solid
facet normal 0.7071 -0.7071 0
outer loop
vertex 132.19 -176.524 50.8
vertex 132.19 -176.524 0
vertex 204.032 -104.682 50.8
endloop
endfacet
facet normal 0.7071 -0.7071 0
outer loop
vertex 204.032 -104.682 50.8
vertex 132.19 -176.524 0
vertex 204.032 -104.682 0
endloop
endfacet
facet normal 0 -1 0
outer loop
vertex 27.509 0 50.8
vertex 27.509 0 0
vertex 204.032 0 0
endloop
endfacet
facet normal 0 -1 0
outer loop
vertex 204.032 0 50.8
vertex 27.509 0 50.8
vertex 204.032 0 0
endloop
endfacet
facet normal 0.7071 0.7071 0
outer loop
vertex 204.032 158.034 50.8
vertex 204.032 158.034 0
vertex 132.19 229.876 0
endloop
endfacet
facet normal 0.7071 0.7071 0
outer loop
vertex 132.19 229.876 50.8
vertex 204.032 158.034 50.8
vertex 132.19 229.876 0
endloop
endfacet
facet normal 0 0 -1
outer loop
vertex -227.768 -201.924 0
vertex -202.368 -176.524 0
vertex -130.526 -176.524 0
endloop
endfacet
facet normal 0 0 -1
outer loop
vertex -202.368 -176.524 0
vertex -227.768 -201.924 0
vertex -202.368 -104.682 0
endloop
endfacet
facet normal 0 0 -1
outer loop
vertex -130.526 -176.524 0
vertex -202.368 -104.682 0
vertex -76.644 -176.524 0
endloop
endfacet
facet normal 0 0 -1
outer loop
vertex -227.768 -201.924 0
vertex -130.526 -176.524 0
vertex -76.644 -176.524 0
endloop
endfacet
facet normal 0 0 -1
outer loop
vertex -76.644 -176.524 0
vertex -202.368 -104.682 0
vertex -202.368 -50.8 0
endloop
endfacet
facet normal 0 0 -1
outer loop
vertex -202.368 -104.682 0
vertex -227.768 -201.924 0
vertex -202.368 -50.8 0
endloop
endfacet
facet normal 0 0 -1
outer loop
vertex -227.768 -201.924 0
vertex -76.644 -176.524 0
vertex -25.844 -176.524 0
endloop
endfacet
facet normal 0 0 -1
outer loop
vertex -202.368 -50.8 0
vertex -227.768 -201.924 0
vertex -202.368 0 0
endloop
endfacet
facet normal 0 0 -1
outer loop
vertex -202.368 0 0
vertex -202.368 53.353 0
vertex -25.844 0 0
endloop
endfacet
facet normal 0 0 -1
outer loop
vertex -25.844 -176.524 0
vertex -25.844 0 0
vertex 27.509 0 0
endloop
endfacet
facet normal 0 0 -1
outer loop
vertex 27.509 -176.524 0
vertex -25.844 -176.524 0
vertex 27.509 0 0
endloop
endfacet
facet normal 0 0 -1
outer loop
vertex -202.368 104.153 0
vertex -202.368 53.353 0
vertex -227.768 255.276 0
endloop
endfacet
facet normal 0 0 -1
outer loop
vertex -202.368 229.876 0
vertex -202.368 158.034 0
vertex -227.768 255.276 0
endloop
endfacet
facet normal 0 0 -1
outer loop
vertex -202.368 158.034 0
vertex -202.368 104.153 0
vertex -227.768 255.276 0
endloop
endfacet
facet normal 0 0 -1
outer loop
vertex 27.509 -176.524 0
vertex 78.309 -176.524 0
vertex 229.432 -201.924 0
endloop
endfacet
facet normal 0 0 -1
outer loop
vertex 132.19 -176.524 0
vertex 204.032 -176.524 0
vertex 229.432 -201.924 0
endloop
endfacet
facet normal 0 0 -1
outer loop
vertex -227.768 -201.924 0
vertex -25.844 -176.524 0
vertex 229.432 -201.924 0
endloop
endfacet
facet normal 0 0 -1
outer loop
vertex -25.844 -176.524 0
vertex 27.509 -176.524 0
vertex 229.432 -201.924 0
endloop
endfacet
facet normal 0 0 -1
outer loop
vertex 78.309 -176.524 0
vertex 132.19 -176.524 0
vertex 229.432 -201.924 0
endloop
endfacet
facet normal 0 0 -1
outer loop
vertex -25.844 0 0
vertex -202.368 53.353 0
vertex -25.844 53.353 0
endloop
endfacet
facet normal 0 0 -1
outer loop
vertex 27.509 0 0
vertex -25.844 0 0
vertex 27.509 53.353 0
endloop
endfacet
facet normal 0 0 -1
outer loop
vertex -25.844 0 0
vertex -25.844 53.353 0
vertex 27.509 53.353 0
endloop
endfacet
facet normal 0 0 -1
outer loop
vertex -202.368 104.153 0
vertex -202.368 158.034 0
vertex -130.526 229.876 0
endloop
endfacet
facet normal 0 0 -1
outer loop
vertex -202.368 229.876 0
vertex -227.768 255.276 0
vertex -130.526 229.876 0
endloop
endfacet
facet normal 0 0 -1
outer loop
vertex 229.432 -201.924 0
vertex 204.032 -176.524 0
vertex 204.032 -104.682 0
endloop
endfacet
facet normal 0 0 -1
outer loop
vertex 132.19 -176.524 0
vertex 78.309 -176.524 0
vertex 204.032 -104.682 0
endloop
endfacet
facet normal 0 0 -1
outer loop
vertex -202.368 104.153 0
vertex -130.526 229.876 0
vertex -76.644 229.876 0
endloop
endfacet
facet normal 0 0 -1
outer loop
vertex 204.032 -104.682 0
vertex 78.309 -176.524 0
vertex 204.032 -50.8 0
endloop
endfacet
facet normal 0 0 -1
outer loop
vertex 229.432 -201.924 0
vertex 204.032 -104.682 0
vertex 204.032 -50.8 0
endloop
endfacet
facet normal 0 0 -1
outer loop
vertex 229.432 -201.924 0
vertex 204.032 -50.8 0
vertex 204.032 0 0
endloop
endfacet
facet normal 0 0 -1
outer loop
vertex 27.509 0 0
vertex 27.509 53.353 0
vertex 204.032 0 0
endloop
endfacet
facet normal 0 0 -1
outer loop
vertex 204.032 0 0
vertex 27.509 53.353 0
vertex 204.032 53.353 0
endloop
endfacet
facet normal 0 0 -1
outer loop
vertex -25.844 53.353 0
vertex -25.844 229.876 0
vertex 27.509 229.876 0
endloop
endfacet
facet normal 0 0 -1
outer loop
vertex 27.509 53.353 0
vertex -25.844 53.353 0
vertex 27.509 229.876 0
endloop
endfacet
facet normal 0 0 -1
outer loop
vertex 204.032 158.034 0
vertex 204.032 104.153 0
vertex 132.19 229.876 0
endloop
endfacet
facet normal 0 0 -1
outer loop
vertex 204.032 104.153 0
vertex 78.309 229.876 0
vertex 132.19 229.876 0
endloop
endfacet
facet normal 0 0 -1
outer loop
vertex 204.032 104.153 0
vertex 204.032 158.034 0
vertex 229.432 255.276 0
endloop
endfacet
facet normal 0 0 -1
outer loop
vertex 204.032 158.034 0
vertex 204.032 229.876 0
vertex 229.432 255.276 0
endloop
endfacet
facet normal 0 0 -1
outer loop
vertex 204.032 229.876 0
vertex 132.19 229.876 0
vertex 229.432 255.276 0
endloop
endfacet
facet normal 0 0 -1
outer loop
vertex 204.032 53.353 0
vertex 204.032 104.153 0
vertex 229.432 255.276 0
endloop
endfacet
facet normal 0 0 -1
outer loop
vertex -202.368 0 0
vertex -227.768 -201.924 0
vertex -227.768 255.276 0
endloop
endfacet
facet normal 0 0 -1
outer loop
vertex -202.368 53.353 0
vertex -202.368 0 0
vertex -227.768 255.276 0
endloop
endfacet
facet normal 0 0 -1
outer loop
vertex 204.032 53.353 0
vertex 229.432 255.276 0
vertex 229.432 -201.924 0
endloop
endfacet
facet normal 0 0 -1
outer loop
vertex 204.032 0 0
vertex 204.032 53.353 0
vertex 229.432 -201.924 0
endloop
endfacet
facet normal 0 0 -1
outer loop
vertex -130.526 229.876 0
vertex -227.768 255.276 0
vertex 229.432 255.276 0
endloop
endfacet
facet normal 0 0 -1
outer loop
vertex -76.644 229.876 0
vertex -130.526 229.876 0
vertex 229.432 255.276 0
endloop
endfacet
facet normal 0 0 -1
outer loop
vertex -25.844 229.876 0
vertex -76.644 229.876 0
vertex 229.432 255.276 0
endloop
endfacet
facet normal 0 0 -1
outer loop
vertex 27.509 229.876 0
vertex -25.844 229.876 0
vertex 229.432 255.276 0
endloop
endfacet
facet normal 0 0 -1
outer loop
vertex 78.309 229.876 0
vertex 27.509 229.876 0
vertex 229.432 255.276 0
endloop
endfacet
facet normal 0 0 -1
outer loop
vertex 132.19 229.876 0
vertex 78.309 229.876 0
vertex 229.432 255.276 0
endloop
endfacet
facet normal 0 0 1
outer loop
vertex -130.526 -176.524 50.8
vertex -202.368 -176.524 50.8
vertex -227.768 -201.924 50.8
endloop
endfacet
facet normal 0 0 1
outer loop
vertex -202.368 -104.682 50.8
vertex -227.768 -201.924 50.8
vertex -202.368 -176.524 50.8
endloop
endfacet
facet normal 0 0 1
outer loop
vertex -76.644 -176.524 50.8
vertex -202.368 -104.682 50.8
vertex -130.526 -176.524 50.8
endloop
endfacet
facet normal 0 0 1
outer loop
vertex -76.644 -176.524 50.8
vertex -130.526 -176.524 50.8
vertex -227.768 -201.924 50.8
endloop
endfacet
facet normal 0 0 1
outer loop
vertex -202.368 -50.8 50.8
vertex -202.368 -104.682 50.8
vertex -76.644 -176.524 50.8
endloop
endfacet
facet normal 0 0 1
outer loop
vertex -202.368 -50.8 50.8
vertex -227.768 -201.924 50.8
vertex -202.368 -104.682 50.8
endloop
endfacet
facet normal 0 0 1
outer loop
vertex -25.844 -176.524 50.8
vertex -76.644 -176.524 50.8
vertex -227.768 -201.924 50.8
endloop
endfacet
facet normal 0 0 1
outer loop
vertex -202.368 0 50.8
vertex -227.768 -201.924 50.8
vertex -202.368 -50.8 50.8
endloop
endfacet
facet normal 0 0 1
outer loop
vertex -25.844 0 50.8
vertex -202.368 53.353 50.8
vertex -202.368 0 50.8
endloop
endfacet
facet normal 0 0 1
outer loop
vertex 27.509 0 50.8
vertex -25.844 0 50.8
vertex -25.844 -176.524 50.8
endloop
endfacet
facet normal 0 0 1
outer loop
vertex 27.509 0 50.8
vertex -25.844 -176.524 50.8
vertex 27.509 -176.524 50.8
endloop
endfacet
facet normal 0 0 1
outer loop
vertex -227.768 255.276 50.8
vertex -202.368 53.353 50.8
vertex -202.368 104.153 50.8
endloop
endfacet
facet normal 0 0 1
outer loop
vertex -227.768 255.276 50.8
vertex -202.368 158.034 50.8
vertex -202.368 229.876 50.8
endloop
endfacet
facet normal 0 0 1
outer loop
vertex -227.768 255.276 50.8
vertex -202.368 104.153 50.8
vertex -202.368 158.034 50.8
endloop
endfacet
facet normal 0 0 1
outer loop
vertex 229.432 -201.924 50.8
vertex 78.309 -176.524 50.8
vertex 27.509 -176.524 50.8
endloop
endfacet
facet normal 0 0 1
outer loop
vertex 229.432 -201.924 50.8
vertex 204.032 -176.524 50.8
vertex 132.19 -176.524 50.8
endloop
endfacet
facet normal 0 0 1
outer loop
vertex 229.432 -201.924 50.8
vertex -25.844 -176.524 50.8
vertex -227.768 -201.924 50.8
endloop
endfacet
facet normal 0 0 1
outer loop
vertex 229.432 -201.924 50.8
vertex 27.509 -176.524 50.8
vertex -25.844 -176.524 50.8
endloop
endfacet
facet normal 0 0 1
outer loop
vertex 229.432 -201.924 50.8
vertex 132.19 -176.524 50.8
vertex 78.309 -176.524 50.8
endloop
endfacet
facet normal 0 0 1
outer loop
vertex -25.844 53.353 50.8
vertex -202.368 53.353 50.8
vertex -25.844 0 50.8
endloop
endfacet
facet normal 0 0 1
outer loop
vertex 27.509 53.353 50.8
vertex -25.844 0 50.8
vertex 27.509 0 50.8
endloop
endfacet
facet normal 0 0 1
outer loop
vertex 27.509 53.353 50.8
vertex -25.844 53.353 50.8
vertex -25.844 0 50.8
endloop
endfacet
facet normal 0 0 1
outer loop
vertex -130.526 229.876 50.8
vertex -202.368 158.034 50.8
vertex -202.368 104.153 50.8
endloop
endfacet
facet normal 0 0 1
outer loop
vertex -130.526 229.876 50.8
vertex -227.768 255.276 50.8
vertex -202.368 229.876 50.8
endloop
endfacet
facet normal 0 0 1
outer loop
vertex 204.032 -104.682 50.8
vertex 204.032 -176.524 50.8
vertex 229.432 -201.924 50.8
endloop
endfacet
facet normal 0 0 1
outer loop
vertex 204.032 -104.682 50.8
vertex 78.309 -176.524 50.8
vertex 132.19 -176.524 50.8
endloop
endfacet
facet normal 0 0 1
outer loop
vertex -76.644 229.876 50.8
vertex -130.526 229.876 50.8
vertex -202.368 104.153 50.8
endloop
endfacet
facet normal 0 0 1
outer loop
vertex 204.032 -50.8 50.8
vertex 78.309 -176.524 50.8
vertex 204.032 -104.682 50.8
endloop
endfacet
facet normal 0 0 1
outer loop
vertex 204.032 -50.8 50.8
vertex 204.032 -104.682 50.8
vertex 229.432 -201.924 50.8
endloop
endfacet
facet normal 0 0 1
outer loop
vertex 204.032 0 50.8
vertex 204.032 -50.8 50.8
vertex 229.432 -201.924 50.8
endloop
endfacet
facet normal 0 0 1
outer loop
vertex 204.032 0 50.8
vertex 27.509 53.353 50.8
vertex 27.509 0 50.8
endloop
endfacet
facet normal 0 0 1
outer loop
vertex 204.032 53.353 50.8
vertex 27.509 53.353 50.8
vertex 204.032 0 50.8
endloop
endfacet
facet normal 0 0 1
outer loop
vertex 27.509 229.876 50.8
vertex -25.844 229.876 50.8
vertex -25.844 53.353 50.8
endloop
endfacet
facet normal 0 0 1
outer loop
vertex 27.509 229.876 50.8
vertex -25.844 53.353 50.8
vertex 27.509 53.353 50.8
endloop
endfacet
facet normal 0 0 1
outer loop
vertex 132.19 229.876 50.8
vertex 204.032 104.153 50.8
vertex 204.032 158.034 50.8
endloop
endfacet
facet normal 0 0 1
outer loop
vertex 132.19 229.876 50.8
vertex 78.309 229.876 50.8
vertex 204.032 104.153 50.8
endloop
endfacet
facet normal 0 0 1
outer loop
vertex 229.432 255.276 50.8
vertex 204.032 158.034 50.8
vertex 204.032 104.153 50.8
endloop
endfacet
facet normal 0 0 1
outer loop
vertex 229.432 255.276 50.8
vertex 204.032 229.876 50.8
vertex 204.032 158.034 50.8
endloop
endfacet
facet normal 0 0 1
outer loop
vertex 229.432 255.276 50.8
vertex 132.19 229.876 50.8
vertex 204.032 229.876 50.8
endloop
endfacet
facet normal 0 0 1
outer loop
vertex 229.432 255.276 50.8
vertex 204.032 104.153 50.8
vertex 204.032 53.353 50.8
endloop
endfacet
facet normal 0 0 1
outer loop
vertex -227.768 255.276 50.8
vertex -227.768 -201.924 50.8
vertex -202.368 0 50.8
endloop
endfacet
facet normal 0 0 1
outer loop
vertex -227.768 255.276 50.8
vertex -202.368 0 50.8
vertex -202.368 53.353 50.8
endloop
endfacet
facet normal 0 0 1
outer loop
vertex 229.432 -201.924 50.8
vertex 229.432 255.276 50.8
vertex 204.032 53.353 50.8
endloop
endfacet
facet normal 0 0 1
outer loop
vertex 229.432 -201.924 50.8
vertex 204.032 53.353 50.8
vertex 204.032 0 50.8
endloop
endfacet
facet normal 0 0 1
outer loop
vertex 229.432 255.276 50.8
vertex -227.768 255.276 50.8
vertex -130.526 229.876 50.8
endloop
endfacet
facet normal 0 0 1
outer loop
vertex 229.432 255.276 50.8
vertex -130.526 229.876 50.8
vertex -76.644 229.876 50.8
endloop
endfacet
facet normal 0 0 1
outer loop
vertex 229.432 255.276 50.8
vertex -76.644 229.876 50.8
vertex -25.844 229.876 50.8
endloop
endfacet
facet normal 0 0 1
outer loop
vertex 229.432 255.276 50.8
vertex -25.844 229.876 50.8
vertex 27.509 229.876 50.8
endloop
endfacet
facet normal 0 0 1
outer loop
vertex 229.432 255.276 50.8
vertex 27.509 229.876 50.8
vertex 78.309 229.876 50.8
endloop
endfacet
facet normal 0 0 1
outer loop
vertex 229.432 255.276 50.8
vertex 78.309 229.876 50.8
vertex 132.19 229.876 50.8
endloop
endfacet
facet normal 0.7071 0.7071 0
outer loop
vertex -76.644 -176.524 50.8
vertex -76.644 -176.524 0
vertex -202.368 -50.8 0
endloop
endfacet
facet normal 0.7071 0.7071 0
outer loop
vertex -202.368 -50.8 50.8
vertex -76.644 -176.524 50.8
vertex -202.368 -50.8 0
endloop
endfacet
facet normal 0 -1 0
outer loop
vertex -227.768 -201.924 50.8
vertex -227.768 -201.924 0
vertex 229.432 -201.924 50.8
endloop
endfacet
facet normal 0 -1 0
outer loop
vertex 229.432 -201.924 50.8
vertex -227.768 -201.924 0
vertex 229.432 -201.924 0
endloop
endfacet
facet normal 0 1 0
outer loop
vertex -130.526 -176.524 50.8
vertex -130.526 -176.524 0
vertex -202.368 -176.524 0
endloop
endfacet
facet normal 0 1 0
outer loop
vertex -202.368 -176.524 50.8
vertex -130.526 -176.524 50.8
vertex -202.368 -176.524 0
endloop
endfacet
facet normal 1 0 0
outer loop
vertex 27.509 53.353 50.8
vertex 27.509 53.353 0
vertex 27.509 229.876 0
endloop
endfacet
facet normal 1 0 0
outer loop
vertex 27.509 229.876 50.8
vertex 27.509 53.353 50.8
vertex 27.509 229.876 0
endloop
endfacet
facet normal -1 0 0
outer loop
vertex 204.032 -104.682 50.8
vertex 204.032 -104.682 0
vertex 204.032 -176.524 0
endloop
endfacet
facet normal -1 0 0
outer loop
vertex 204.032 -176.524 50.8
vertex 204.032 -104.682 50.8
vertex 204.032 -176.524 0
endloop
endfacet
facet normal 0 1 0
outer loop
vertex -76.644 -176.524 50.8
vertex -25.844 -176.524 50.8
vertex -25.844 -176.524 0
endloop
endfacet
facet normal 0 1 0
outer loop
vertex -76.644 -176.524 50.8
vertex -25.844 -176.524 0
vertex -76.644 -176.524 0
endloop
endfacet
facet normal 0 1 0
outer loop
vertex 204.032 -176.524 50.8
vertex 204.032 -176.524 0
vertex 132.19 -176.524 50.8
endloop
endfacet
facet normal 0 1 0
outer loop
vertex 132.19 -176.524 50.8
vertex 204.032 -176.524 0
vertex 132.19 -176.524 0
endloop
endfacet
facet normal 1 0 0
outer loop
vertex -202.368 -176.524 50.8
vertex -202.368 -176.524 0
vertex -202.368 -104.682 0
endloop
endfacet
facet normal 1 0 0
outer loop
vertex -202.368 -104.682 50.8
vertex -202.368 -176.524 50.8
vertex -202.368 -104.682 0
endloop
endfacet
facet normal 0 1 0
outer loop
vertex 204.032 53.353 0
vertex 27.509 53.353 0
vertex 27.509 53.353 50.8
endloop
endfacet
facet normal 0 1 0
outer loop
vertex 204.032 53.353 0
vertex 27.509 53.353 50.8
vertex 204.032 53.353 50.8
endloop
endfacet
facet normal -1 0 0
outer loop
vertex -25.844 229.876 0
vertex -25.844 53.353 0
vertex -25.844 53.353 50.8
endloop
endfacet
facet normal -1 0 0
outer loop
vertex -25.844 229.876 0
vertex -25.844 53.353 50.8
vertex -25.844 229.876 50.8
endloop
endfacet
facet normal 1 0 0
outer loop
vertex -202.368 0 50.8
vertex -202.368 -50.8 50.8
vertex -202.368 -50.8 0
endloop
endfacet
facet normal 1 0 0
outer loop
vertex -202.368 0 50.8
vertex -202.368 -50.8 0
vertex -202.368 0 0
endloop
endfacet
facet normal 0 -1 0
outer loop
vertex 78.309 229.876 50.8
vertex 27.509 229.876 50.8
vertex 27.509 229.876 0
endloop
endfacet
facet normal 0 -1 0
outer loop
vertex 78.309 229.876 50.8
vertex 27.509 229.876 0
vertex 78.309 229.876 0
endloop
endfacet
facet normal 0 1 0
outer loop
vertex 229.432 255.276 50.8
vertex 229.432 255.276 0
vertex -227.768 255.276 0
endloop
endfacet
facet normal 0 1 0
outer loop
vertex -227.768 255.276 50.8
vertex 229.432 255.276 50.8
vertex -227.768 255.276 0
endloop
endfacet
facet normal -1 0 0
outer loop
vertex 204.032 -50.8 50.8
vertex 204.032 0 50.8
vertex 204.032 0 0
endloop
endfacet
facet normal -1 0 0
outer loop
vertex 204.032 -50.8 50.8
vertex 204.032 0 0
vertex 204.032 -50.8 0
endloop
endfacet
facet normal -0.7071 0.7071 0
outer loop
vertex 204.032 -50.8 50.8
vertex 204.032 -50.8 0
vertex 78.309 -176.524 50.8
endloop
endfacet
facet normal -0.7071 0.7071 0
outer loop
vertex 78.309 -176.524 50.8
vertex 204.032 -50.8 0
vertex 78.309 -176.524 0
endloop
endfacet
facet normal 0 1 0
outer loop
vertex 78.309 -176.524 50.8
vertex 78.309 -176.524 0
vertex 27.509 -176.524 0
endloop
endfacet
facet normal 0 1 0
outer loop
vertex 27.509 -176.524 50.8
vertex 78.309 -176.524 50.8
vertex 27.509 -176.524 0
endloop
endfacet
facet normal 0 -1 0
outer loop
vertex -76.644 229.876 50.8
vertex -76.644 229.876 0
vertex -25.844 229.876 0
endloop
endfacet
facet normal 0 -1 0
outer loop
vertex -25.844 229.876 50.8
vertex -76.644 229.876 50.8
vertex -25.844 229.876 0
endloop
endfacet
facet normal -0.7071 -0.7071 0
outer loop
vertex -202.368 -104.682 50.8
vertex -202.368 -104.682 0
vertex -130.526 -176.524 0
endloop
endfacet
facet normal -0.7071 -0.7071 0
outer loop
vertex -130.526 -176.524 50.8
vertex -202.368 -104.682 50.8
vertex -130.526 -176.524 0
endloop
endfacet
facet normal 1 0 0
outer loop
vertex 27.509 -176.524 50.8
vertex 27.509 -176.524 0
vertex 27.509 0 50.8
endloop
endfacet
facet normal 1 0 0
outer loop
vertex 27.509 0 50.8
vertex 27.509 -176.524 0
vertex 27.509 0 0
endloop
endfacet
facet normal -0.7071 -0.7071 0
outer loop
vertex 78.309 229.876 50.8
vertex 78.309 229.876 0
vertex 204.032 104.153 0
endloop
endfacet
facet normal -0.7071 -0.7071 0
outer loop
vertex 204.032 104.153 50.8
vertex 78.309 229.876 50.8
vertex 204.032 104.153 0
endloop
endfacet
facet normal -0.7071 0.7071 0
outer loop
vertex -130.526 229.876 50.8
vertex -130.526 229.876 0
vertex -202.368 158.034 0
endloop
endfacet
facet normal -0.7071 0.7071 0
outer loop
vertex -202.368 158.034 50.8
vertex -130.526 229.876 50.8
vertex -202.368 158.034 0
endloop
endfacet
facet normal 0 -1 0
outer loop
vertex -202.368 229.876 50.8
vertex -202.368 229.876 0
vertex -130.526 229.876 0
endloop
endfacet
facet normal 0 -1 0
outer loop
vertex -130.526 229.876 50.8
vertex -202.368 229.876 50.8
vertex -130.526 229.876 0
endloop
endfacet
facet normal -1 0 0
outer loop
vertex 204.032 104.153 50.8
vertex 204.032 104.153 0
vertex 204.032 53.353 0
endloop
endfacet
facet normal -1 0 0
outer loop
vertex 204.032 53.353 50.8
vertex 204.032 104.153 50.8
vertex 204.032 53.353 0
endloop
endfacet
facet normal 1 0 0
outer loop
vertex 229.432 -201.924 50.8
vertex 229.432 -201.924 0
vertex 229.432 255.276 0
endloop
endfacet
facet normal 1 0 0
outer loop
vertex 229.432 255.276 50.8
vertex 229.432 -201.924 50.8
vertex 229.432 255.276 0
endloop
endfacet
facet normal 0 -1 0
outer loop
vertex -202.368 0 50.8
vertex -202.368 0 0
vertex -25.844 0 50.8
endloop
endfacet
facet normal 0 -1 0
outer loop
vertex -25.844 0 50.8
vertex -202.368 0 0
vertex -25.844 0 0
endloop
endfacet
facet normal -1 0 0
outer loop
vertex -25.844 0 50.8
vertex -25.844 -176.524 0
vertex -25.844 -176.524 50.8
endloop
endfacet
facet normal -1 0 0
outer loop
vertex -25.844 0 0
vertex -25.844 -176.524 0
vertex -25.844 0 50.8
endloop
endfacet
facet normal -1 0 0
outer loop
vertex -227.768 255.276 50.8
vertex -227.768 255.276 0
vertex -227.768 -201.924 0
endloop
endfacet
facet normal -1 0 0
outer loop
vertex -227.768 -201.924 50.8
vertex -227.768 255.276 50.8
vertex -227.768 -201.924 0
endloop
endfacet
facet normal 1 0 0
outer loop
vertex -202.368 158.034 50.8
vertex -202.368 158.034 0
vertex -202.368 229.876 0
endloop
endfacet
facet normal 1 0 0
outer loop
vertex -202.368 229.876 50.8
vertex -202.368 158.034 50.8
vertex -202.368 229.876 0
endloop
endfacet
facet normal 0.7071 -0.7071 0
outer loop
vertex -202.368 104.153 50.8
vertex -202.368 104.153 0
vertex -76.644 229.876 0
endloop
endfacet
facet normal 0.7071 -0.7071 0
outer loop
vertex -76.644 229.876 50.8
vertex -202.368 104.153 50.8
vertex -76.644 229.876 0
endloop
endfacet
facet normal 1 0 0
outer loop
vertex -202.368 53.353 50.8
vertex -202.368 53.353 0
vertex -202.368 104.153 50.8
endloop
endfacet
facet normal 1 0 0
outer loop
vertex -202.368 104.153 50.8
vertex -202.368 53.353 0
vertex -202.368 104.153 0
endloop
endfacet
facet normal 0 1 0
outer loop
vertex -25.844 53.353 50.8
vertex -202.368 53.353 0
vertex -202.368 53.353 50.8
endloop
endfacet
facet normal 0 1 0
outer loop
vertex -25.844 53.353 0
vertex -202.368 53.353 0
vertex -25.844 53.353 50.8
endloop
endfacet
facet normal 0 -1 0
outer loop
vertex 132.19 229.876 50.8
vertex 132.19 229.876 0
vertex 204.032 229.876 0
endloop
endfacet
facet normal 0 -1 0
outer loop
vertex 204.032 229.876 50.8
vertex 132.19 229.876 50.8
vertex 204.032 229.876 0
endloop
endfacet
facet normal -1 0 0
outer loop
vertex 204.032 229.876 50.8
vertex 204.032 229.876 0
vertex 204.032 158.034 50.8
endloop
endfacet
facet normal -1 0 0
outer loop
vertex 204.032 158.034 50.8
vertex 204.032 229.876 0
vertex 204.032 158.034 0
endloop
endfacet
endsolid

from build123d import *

# Parameters (mm, degrees)
F1_DEPTH = 50.8
F2_DEPTH = 50.8
F3_DEPTH = 50.8
F0_W     = 53.3528286101
F0_H     = 176.523585695
F0_W_2   = 176.523585695
F0_H_2   = 53.3528286101
F4_DEPTH = 50.8


with BuildPart() as f1:
    # F0 (on Top) → F1 (new body)
    with BuildSketch(Plane.XY):
        Polygon((-202.3678548309, 229.876414305), (-227.7678548309, 255.276414305), (-227.7678548309, -201.923585695), (-202.3678548309, -176.523585695), (-202.3678548309, -104.6815367264), (-202.3678548309, -50.8), (-202.3678548309, 0), (-202.3678548309, 53.3528286101), (-202.3678548309, 104.1528286101), (-202.3678548309, 158.0343653365), align=None)
        Polygon((-202.3678548309, -176.523585695), (-227.7678548309, -201.923585695), (229.4321451691, -201.923585695), (204.0321451691, -176.523585695), (132.1900962006, -176.523585695), (78.3085594741, -176.523585695), (27.5085594741, -176.523585695), (-25.8442691359, -176.523585695), (-76.6442691359, -176.523585695), (-130.5258058623, -176.523585695), align=None)
        Polygon((229.4321451691, -201.923585695), (229.4321451691, 255.276414305), (204.0321451691, 229.876414305), (204.0321451691, 158.0343653365), (204.0321451691, 104.1528286101), (204.0321451691, 53.3528286101), (204.0321451691, 0), (204.0321451691, -50.8), (204.0321451691, -104.6815367264), (204.0321451691, -176.523585695), align=None)
        Polygon((229.4321451691, 255.276414305), (-227.7678548309, 255.276414305), (-202.3678548309, 229.876414305), (-130.5258058623, 229.876414305), (-76.6442691359, 229.876414305), (-25.8442691359, 229.876414305), (27.5085594741, 229.876414305), (78.3085594741, 229.876414305), (132.1900962006, 229.876414305), (204.0321451691, 229.876414305), align=None)
    extrude(amount=F1_DEPTH)

    # F0 (on Top) → F2 (cut)
    with BuildSketch(Plane.XY):
        Polygon((-76.6442691359, 229.876414305), (-130.5258058623, 229.876414305), (-202.3678548309, 158.0343653365), (-202.3678548309, 104.1528286101), align=None)
    extrude(amount=F2_DEPTH, mode=Mode.SUBTRACT)

    # F0 (on Top) → F3 (join)
    with BuildSketch(Plane.XY):
        Polygon((132.1900962006, -176.523585695), (204.0321451691, -104.6815367264), (204.0321451691, -50.8), (78.3085594741, -176.523585695), align=None)
        Polygon((204.0321451691, 158.0343653365), (132.1900962006, 229.876414305), (78.3085594741, 229.876414305), (204.0321451691, 104.1528286101), align=None)
        Polygon((-76.6442691359, 229.876414305), (-130.5258058623, 229.876414305), (-202.3678548309, 158.0343653365), (-202.3678548309, 104.1528286101), align=None)
        Polygon((-202.3678548309, -104.6815367264), (-130.5258058623, -176.523585695), (-76.6442691359, -176.523585695), (-202.3678548309, -50.8), align=None)
    extrude(amount=F3_DEPTH)

    # F0 (on Top) → F4 (join)
    with BuildSketch(Plane.XY):
        with Locations((0.8321451691, -88.2617928475)):
            Rectangle(F0_W, F0_H)
        with Locations((115.7703523216, 26.676414305)):
            Rectangle(F0_W_2, F0_H_2)
        with Locations((0.8321451691, 141.6146214575)):
            Rectangle(F0_W, F0_H)
        with Locations((-114.1060619834, 26.676414305)):
            Rectangle(F0_W_2, F0_H_2)
        with Locations((0.8321451691, 26.676414305)):
            Rectangle(F0_W, F0_H_2)
    extrude(amount=F4_DEPTH)


solid = f1.part
